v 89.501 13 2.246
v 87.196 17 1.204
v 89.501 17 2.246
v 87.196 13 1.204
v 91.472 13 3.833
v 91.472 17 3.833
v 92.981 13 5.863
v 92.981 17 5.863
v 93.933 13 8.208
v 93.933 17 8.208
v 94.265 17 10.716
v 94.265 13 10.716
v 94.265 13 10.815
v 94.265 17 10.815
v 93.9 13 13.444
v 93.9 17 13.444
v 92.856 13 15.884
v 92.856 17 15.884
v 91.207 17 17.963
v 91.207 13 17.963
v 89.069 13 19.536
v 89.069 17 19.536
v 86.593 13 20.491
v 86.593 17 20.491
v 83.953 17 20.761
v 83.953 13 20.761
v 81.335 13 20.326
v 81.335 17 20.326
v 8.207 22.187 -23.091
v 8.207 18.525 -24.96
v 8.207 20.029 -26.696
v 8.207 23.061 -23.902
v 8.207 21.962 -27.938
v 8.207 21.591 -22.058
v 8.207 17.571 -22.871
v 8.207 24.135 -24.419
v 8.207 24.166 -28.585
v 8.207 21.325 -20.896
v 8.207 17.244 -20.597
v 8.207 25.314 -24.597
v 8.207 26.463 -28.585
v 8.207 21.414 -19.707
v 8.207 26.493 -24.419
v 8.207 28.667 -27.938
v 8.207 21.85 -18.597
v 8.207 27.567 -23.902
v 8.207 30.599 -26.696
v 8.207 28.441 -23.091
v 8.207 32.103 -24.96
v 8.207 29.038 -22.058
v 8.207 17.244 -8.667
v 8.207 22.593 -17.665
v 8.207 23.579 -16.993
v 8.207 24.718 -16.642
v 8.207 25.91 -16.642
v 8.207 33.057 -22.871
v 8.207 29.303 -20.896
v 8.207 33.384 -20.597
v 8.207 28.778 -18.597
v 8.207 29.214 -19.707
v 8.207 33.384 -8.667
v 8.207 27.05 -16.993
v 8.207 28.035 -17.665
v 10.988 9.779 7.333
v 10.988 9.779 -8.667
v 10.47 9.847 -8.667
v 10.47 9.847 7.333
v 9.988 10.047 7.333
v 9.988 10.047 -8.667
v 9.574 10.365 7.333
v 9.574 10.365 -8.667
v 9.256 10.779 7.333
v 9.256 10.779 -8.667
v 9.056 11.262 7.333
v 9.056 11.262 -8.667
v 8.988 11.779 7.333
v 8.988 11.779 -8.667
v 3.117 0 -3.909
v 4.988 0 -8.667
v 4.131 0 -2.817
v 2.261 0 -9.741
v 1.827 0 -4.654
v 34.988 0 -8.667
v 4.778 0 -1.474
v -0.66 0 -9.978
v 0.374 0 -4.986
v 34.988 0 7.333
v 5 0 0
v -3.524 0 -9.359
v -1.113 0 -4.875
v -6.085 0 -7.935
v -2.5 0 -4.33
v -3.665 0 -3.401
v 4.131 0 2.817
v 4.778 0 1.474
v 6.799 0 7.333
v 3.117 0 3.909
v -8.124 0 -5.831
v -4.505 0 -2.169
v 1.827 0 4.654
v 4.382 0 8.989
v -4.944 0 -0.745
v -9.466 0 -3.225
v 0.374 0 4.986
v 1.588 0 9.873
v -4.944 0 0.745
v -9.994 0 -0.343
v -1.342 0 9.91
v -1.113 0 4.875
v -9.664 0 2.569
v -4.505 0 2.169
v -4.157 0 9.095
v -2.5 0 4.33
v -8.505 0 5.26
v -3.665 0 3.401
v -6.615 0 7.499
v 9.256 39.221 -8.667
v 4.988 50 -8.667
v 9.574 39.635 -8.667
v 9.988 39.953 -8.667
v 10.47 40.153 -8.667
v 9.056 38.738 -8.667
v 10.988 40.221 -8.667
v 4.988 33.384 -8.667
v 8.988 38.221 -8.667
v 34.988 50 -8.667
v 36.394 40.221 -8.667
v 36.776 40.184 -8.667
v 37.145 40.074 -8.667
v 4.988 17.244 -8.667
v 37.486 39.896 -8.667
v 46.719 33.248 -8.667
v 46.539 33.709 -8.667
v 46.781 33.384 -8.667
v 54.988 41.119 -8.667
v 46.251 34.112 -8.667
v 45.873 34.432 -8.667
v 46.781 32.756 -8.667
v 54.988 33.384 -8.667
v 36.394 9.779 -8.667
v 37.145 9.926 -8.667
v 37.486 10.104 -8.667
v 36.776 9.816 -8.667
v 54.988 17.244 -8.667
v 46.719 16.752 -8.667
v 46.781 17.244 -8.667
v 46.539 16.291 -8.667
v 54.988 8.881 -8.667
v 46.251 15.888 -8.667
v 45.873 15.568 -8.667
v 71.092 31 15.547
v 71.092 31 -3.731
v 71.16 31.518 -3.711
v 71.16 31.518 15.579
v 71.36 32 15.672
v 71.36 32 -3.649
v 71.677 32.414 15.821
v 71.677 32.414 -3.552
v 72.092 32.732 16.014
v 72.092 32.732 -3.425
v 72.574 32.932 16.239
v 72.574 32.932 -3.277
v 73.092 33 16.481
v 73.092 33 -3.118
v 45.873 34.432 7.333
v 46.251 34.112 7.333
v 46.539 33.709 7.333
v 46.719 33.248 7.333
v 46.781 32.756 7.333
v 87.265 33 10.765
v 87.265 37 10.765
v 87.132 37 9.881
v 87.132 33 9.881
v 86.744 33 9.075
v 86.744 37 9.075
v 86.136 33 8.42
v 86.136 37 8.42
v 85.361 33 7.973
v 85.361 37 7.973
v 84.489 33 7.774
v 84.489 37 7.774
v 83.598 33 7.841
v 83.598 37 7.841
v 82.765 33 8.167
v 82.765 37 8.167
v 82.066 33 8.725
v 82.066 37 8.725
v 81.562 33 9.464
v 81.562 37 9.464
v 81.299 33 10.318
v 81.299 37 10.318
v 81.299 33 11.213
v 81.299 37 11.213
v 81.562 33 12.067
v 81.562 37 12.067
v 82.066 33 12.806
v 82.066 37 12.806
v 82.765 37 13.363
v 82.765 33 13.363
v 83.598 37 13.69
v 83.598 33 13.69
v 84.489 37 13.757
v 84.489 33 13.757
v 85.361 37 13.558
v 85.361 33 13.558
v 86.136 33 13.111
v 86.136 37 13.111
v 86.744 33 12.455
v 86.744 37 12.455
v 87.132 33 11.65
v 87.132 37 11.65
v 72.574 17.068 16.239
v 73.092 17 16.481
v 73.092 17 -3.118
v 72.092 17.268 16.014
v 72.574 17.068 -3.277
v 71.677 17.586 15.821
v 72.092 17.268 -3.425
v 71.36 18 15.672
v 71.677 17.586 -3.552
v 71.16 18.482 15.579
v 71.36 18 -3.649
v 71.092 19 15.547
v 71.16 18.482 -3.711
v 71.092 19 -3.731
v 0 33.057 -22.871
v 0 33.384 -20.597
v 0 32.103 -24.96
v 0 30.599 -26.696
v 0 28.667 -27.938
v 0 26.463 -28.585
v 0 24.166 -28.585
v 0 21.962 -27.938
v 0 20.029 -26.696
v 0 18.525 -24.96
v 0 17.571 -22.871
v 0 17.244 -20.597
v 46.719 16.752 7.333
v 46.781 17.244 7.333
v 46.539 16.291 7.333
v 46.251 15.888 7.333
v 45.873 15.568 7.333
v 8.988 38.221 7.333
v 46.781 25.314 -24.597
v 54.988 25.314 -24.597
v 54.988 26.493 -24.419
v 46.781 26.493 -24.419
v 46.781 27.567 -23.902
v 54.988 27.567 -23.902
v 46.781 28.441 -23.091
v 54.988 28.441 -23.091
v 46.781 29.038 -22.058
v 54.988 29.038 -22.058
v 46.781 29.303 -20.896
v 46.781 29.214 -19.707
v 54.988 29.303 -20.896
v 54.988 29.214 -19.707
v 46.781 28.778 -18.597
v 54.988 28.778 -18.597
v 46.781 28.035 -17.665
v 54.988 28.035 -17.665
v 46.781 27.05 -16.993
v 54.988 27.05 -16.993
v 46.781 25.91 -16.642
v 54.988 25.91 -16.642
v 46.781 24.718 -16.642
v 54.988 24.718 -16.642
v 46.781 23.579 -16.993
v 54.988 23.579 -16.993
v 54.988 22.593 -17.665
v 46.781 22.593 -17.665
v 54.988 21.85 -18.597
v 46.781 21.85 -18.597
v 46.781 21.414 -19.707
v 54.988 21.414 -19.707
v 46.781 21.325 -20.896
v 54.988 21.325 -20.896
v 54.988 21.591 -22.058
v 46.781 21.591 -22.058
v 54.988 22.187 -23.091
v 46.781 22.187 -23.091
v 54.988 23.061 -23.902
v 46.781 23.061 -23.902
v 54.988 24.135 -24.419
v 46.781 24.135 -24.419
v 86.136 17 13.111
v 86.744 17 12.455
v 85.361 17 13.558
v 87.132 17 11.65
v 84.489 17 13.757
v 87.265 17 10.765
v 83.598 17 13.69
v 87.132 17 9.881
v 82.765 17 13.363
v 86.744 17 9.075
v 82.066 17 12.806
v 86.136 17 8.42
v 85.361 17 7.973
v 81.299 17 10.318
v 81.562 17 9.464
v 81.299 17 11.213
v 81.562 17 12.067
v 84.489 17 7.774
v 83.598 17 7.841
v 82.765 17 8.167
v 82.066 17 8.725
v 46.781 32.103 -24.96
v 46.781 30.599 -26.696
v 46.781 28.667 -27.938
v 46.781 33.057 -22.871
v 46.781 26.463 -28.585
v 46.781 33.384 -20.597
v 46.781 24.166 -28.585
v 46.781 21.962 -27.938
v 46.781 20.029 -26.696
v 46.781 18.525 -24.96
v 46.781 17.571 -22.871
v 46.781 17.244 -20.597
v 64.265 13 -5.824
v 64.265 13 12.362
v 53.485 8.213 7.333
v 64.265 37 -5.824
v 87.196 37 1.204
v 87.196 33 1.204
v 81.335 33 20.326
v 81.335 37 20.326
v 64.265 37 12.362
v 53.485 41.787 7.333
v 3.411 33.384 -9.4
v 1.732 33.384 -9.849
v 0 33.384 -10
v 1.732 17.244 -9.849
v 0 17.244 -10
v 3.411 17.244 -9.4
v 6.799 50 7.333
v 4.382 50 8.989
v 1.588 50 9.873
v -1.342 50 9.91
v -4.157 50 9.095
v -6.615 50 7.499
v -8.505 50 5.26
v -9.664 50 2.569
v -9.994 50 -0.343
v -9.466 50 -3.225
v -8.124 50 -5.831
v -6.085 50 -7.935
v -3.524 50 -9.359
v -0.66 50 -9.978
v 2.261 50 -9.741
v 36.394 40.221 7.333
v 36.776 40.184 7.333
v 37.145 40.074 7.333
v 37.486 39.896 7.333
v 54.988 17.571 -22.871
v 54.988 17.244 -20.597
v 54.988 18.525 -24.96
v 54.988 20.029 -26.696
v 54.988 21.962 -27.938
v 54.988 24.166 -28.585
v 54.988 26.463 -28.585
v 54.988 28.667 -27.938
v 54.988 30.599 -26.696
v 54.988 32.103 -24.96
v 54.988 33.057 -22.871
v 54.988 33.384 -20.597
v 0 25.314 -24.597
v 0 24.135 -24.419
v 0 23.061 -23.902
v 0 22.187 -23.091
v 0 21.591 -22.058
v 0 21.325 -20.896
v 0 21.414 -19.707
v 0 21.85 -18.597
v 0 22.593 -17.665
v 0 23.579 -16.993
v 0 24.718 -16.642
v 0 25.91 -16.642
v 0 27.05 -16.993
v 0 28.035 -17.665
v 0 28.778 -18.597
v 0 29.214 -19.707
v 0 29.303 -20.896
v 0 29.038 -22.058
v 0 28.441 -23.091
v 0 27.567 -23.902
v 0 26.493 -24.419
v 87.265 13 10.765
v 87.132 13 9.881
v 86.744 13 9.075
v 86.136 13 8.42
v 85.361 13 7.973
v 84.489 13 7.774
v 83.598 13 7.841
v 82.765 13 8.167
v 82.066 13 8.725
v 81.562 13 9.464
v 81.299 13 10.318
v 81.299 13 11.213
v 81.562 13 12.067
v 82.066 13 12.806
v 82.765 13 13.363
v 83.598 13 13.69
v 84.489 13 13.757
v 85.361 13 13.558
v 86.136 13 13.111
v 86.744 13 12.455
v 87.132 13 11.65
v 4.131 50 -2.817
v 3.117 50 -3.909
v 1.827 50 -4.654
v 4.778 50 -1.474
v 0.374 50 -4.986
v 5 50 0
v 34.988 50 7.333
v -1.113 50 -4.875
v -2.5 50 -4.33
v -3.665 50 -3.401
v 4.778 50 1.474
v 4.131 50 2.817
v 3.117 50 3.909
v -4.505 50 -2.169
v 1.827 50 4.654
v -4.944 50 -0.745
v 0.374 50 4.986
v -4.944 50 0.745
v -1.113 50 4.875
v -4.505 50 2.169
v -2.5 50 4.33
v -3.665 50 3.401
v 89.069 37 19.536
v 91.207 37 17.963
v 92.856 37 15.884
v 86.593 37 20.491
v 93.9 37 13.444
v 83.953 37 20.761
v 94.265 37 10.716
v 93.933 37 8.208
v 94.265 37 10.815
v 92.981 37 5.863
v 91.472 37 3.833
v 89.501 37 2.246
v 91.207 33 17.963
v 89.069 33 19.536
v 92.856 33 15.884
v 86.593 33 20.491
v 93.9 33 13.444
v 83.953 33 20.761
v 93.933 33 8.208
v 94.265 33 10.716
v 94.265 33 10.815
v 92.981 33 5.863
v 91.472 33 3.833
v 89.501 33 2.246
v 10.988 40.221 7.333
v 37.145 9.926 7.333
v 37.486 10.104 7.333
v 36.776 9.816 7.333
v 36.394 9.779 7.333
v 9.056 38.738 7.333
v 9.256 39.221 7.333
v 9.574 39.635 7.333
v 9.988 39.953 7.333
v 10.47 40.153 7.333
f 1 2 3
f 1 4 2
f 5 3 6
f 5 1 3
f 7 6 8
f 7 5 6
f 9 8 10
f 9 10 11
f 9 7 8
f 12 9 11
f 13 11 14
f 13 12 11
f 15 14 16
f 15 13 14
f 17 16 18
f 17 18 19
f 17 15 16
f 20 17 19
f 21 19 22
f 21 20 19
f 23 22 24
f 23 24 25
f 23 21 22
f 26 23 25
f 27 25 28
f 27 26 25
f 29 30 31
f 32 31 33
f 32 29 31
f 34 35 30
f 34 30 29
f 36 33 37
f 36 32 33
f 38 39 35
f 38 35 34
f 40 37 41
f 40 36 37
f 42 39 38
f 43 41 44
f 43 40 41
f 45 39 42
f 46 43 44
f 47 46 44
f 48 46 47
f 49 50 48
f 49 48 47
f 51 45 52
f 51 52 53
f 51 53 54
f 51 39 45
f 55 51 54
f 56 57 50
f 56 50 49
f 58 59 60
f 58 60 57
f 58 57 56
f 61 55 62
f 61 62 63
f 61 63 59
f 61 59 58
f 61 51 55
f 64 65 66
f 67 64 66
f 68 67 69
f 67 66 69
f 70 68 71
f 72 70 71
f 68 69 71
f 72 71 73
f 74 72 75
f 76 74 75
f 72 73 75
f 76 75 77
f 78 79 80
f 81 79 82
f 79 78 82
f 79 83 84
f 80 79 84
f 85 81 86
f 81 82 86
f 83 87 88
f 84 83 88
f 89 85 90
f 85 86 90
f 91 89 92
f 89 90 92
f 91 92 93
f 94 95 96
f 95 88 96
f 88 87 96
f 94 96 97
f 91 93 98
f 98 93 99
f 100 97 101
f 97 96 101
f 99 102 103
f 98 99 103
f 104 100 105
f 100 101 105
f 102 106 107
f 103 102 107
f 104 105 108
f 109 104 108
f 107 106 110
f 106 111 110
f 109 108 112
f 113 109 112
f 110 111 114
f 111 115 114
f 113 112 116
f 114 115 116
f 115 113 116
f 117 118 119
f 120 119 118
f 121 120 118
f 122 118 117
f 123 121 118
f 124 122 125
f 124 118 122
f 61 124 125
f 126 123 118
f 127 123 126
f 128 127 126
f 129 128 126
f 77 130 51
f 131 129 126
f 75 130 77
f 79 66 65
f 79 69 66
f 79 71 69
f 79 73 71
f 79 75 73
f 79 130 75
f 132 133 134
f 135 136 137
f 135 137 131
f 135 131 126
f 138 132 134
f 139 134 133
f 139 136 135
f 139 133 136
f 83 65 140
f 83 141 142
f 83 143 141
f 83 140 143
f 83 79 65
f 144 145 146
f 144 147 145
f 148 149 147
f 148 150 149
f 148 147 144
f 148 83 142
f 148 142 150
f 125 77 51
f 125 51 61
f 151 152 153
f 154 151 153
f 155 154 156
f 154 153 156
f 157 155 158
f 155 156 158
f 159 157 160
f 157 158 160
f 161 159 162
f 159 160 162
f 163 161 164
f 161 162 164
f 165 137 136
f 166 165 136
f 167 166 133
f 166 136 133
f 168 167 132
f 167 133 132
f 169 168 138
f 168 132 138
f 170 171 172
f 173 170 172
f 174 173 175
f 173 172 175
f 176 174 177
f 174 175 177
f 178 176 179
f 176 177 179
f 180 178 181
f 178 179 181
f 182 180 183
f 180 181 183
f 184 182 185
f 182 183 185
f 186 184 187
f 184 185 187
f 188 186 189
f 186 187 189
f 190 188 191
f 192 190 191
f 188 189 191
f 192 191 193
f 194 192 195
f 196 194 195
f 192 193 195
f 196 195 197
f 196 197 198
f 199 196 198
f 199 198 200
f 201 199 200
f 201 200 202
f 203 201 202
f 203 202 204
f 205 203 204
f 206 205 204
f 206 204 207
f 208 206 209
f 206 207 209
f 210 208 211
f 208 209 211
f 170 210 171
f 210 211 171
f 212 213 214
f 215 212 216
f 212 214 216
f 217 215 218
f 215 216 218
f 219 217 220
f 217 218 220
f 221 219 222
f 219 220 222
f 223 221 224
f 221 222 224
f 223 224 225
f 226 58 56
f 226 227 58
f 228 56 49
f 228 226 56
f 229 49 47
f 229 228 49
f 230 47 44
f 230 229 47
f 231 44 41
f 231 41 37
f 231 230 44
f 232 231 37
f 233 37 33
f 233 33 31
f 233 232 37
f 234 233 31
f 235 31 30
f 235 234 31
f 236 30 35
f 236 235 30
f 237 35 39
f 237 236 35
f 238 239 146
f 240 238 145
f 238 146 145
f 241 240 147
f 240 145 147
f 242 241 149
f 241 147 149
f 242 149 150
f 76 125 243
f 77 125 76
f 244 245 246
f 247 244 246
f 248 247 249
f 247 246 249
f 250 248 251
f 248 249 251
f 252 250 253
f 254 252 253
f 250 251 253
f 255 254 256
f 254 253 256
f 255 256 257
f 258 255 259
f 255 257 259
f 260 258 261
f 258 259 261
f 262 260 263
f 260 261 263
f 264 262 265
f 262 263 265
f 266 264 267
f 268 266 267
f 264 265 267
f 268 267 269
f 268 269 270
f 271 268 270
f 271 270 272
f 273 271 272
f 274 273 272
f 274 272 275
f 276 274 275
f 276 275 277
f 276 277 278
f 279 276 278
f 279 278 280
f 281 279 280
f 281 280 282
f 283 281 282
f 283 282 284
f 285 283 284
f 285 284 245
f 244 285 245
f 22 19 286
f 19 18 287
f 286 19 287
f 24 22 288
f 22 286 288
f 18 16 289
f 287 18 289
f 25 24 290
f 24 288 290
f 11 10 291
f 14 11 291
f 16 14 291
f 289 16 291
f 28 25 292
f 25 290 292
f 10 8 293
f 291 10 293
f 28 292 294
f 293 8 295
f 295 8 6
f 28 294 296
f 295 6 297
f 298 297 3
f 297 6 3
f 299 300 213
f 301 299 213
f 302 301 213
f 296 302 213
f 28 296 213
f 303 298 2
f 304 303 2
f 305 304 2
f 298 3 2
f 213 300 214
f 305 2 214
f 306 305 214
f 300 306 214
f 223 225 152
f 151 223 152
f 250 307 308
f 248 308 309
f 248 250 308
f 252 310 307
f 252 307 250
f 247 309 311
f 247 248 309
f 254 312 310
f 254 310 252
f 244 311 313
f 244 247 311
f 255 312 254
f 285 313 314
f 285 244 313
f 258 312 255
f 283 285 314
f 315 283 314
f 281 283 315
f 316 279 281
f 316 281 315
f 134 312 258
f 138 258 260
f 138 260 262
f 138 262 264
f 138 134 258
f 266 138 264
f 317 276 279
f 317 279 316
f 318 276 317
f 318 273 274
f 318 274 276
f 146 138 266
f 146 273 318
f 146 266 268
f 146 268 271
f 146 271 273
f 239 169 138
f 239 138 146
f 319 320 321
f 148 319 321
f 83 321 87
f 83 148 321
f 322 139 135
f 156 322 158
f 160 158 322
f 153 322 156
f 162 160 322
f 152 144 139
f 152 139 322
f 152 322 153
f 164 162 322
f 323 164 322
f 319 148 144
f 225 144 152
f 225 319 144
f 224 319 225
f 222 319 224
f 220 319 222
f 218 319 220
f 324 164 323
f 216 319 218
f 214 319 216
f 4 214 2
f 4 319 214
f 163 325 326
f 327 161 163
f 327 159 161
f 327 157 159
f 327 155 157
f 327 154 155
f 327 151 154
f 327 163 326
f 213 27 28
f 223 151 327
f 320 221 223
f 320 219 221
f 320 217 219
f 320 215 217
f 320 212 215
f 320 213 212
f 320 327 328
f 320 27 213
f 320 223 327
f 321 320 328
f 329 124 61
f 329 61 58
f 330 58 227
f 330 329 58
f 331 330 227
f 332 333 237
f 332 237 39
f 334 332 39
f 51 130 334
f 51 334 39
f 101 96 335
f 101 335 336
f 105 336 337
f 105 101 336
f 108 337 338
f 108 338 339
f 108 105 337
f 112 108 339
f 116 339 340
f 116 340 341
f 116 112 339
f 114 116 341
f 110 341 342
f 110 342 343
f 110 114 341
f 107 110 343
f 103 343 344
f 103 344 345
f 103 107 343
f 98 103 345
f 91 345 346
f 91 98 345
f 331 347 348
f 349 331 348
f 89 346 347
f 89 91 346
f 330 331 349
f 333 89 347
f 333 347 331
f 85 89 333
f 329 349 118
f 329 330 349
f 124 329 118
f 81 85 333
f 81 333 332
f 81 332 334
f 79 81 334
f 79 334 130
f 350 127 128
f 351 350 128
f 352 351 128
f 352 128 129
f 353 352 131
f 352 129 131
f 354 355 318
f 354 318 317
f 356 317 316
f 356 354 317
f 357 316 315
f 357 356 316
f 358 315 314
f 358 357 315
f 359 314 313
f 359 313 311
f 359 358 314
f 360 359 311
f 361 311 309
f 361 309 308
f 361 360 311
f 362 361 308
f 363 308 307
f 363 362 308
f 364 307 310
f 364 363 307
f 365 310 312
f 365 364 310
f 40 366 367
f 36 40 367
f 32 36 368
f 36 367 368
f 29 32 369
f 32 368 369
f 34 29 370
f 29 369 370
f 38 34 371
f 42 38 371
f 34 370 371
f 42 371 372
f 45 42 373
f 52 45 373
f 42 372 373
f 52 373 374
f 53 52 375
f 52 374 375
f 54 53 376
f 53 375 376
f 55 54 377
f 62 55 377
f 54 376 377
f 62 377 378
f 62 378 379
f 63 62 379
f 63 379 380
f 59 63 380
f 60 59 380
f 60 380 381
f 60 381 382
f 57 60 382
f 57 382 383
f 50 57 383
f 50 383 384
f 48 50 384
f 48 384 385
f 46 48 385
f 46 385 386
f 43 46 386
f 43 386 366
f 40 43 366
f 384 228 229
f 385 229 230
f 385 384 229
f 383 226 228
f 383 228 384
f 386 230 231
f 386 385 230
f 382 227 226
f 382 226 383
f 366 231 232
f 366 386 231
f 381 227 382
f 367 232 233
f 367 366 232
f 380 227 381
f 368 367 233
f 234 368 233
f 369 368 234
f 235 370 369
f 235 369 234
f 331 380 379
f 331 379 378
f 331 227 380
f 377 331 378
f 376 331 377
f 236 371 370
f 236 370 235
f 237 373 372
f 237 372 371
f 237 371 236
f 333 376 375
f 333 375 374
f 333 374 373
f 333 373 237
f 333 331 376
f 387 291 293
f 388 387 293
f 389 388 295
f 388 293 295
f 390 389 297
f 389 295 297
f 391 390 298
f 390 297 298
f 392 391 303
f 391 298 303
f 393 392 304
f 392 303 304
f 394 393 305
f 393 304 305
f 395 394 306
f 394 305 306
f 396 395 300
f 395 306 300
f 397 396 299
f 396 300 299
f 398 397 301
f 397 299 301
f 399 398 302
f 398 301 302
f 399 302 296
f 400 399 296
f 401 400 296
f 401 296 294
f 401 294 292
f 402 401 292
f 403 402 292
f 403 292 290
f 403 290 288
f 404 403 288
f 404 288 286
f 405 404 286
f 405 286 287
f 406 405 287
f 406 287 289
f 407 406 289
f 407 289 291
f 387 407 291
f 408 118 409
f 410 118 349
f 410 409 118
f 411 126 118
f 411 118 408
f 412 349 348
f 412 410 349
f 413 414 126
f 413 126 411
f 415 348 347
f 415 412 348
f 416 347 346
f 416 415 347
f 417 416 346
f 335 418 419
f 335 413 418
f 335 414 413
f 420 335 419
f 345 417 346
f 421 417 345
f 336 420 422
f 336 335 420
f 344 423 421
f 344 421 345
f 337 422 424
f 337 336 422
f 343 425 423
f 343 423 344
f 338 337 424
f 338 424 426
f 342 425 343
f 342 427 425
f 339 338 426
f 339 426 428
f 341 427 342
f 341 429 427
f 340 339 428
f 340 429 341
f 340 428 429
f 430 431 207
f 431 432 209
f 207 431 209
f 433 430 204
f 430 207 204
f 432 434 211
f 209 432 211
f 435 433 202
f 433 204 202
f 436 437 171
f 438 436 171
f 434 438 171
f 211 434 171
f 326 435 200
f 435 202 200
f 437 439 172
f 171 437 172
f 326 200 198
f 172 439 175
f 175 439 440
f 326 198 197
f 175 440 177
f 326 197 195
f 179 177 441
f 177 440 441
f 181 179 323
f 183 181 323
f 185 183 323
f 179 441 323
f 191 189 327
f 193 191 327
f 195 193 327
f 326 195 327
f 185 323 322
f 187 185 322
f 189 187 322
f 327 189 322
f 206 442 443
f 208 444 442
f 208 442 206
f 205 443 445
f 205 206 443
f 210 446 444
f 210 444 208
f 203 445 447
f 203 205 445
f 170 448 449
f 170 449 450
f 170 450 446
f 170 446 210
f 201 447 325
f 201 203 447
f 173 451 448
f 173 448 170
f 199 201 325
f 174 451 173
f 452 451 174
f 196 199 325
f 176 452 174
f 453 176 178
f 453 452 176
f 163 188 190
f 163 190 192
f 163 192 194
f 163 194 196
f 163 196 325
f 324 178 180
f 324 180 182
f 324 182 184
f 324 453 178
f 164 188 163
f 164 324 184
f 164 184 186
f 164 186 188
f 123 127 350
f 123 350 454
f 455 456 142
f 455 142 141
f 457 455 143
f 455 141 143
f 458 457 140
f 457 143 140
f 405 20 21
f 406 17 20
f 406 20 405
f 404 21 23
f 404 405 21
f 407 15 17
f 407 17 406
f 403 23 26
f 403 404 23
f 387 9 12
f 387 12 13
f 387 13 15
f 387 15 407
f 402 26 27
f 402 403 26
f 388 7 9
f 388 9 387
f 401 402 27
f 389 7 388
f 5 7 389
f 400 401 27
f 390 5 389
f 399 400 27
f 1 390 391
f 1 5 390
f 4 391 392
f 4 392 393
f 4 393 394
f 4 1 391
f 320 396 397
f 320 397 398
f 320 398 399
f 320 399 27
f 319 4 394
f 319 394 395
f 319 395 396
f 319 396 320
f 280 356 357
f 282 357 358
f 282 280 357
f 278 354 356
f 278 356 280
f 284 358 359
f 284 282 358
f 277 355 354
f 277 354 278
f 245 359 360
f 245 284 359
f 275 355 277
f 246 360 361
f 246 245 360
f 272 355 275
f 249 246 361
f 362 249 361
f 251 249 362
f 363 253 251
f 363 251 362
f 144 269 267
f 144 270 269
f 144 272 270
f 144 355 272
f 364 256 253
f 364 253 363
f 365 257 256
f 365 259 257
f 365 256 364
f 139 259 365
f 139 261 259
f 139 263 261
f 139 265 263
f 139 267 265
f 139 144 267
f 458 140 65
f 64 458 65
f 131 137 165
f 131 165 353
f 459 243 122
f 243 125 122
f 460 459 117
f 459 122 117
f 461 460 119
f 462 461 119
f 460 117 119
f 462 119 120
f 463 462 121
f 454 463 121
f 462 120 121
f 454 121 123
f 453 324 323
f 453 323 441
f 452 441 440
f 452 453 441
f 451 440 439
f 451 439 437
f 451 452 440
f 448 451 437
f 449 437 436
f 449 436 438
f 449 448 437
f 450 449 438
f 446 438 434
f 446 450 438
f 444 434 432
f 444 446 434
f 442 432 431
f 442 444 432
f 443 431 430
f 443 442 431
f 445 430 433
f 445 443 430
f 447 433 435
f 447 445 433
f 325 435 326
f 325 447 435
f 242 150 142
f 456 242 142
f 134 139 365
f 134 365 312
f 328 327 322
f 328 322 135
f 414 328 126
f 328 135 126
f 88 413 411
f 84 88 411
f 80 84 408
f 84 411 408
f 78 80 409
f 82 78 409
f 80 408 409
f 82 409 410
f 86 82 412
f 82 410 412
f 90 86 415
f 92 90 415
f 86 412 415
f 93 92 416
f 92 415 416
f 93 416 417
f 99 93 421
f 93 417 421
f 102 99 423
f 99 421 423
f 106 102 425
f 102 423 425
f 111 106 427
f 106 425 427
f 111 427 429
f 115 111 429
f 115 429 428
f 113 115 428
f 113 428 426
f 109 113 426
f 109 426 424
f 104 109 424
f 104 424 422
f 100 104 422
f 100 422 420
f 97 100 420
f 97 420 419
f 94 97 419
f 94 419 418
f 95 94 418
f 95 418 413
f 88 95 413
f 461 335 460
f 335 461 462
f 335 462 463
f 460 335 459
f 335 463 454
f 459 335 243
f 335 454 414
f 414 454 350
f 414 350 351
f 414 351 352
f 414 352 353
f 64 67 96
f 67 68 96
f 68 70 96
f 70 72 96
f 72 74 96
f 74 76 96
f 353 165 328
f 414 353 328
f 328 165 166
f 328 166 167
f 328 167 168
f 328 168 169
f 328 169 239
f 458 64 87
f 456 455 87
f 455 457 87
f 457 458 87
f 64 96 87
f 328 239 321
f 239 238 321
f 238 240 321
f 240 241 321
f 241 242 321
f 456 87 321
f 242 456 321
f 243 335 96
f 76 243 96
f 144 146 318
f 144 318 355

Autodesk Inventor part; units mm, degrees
sketch "Boceto1" plane through (0, 0, 0) normal (0, 1, 0) x (-1, 0, 0)
  circle A0 centre (0, 0) radius 10
  line L0 (-4.9878, -8.6673) -> (-54.9878, -8.6673)
  line L1 (-6.7993, 7.3327) -> (-53.4848, 7.3327)
  line L2 (-54.9878, -8.6673) -> (-87.1955, 1.2044)
  arc A1 (-81.3346, 20.3264) -> (-87.1955, 1.2044) centre (-84.2651, 10.7654) ccw
  line L3 (-81.3346, 20.3264) -> (-53.4848, 7.3327)
  dimension "d0" = 20
  dimension "d1" = 16
  dimension "d2" = 10
  dimension "d3" = 50
  dimension "d25" = 154.988
extrude "Extrusión1" add sketch "Boceto1" along normal blind 50
sketch "Boceto2" plane through (54.9878, 0, -8.6673) normal (0, 0, -1) x (-1, 0, 0)
  line L0 (-39.2772, 0) -> (-39.2772, 50) projected
  line L1 (-32.2077, 50) -> (0, 50) projected
  line L2 (-32.2077, 0) -> (0, 0) projected
  line L3 (0, 0) -> (50, 0) projected
  line L4 (0, 50) -> (50, 50) projected
  line L5 (92.4078, 25) -> (-89.4019, 25)
  line L6 (-39.2772, 17) -> (-18.1038, 17)
  line L7 (-16.1038, 19) -> (-16.1038, 25)
  line L8 (-39.2772, 13) -> (-9.2772, 13)
  line L9 (-9.2772, 13) -> (20, 0)
  line L10 (48.1885, 0) -> (1.503, 0) projected
  line L11 (8.207, 25) -> (8.207, 17.2439)
  line L12 (9.1152, 15.5682) -> (17.5023, 10.1036)
  line L13 (18.5941, 9.7793) -> (44, 9.7793)
  line L14 (46, 11.7793) -> (46, 25)
  line L15 (50, 0) -> (20, 0)
  line L16 (64.9878, 0) -> (48.1885, 0) projected
  line L17 (50, 50) -> (50, 0) projected
  arc A0 (-18.1038, 17) -> (-16.1038, 19) centre (-18.1038, 19) ccw
  arc A1 (8.207, 17.2439) -> (9.1152, 15.5682) centre (10.207, 17.2439) ccw
  arc A2 (17.5023, 10.1036) -> (18.5941, 9.7793) centre (18.5941, 11.7793) ccw
  arc A3 (44, 9.7793) -> (46, 11.7793) centre (44, 11.7793) ccw
  line L18 (20, 0) -> (-39.2772, 0)
  line L19 (-26.3468, 0) -> (-39.2772, 0) projected
  line L20 (-39.2772, 17) -> (-39.2772, 25)
  line L21 (0, 50) -> (50, 50)
  line L22 (-39.2772, 33) -> (-18.1038, 33)
  line L23 (-16.1038, 31) -> (-16.1038, 25)
  line L24 (-39.2772, 37) -> (-9.2772, 37)
  line L25 (-9.2772, 37) -> (20, 50)
  line L26 (48.1885, 50) -> (1.503, 50)
  line L27 (8.207, 25) -> (8.207, 32.7561)
  line L28 (9.1152, 34.4318) -> (17.5023, 39.8964)
  line L29 (18.5941, 40.2207) -> (44, 40.2207)
  line L30 (46, 38.2207) -> (46, 25)
  line L31 (50, 0) -> (50, 50)
  arc A4 (-16.1038, 31) -> (-18.1038, 33) centre (-18.1038, 31) ccw
  arc A5 (9.1152, 34.4318) -> (8.207, 32.7561) centre (10.207, 32.7561) ccw
  arc A6 (18.5941, 40.2207) -> (17.5023, 39.8964) centre (18.5941, 38.2207) ccw
  arc A7 (46, 38.2207) -> (44, 40.2207) centre (44, 38.2207) ccw
  line L32 (20, 50) -> (-39.2772, 50)
  line L33 (-39.2772, 50) -> (-39.2772, 37)
  line L34 (-39.2772, 33) -> (-39.2772, 17)
  line L35 (-39.2772, 13) -> (-39.2772, 0)
  point P0 (54.9878, 0)
  point P1 (1.503, 25)
  point P2 (18, 9.7793)
  point P3 (46, 9.7793)
  dimension "d6" = 12
  dimension "d7" = 4
  dimension "d8" = 30
  dimension "d9" = 30
  dimension "d10" = 28
  dimension "d11" = 4
  dimension "d12" = 2
extrude "Extrusión2" cut sketch "Boceto2" against normal through all contours L0 L8 L9 L3 L2 L18 | L0 L5 L7 A0 L6 | L0 L22 A4 L23 L5 | L0 L32 L1 L4 L25 L24 | L27 A5 L28 A6 L29 A7 L30 L5 | L5 L14 A3 L13 A2 L12 A1 L11
sketch "Boceto3" plane through (0, 50, 0) normal (0, 1, 0) x (1, 0, 0)
  circle A0 centre (0, 0) radius 5
  arc A1 (81.3346, -20.3264) -> (87.1955, -1.2044) centre (84.2651, -10.7654) ccw projected
  circle A2 centre (84.2651, -10.7654) radius 3
  dimension "d15" = 10
  dimension "d16" = 6
extrude "Extrusión3" cut sketch "Boceto3" against normal through all
sketch "Boceto4" plane through (4.9878, 0, -8.6673) normal (0, 0, -1) x (-1, 0, 0)
  line L0 (-50, 8.8806) -> (-50, 41.1194) projected
  line L1 (-41.793, 17.2439) -> (-50, 17.2439)
  line L2 (-50, 17.2439) -> (-50, 33.3843)
  line L3 (-50, 33.3843) -> (-41.793, 33.3843)
  line L4 (-41.793, 33.3843) -> (-41.793, 17.2439)
  point P0 (4.9878, 0)
extrude "Extrusión4" add sketch "Boceto4" along normal blind 20
sketch "Boceto5" plane through (54.9878, 17.2439, -8.6673) normal (1, 0, 0) x (0, 0, -1)
  line L0 (20, 16.1404) -> (20, 0) projected
  line L1 (0, 16.1404) -> (20, 16.1404) projected
  line L2 (0, 0) -> (20, 0) projected
  circle A0 centre (11.9298, 8.0702) radius 8.0702
  line L3 (11.9298, 16.1404) -> (20, 16.1404)
  line L4 (20, 16.1404) -> (20, 8.0702)
  line L5 (20, 8.0702) -> (20, 0)
  line L6 (20, 0) -> (11.9298, 0)
  circle A1 centre (11.9298, 8.0702) radius 4
  point P0 (-8.6673, -17.2439)
  dimension "d21" = 8
extrude "Extrusión5" cut sketch "Boceto5" against normal up to next contours L0 A0 L1 | L0 L2 A0 | A1
ref_plane "Plano de trabajo1" through (54.9878, 17.2439, -20.5971) normal (1, 0, 0) x (0, 0, -1)
ref_plane "Plano de trabajo3" through (27.4939, 50, 0) normal (1, 0, 0) x (0, -1, 0)
ref_plane "Plano de trabajo2" through (0, 50, 0) normal (1, 0, 0) x (0, -1, 0)
mirror "Simetría1" about plane through (27.4939, 50, 0) normal (1, 0, 0) of "Extrusión5", "Extrusión4"
ref_plane "Plano de trabajo6" through (46.7808, 33.3843, -20.5971) normal (-1, 0, 0) x (0, 0, 1)
properties part number "wheel_holder" material "Acero inoxidable, austenítico"
